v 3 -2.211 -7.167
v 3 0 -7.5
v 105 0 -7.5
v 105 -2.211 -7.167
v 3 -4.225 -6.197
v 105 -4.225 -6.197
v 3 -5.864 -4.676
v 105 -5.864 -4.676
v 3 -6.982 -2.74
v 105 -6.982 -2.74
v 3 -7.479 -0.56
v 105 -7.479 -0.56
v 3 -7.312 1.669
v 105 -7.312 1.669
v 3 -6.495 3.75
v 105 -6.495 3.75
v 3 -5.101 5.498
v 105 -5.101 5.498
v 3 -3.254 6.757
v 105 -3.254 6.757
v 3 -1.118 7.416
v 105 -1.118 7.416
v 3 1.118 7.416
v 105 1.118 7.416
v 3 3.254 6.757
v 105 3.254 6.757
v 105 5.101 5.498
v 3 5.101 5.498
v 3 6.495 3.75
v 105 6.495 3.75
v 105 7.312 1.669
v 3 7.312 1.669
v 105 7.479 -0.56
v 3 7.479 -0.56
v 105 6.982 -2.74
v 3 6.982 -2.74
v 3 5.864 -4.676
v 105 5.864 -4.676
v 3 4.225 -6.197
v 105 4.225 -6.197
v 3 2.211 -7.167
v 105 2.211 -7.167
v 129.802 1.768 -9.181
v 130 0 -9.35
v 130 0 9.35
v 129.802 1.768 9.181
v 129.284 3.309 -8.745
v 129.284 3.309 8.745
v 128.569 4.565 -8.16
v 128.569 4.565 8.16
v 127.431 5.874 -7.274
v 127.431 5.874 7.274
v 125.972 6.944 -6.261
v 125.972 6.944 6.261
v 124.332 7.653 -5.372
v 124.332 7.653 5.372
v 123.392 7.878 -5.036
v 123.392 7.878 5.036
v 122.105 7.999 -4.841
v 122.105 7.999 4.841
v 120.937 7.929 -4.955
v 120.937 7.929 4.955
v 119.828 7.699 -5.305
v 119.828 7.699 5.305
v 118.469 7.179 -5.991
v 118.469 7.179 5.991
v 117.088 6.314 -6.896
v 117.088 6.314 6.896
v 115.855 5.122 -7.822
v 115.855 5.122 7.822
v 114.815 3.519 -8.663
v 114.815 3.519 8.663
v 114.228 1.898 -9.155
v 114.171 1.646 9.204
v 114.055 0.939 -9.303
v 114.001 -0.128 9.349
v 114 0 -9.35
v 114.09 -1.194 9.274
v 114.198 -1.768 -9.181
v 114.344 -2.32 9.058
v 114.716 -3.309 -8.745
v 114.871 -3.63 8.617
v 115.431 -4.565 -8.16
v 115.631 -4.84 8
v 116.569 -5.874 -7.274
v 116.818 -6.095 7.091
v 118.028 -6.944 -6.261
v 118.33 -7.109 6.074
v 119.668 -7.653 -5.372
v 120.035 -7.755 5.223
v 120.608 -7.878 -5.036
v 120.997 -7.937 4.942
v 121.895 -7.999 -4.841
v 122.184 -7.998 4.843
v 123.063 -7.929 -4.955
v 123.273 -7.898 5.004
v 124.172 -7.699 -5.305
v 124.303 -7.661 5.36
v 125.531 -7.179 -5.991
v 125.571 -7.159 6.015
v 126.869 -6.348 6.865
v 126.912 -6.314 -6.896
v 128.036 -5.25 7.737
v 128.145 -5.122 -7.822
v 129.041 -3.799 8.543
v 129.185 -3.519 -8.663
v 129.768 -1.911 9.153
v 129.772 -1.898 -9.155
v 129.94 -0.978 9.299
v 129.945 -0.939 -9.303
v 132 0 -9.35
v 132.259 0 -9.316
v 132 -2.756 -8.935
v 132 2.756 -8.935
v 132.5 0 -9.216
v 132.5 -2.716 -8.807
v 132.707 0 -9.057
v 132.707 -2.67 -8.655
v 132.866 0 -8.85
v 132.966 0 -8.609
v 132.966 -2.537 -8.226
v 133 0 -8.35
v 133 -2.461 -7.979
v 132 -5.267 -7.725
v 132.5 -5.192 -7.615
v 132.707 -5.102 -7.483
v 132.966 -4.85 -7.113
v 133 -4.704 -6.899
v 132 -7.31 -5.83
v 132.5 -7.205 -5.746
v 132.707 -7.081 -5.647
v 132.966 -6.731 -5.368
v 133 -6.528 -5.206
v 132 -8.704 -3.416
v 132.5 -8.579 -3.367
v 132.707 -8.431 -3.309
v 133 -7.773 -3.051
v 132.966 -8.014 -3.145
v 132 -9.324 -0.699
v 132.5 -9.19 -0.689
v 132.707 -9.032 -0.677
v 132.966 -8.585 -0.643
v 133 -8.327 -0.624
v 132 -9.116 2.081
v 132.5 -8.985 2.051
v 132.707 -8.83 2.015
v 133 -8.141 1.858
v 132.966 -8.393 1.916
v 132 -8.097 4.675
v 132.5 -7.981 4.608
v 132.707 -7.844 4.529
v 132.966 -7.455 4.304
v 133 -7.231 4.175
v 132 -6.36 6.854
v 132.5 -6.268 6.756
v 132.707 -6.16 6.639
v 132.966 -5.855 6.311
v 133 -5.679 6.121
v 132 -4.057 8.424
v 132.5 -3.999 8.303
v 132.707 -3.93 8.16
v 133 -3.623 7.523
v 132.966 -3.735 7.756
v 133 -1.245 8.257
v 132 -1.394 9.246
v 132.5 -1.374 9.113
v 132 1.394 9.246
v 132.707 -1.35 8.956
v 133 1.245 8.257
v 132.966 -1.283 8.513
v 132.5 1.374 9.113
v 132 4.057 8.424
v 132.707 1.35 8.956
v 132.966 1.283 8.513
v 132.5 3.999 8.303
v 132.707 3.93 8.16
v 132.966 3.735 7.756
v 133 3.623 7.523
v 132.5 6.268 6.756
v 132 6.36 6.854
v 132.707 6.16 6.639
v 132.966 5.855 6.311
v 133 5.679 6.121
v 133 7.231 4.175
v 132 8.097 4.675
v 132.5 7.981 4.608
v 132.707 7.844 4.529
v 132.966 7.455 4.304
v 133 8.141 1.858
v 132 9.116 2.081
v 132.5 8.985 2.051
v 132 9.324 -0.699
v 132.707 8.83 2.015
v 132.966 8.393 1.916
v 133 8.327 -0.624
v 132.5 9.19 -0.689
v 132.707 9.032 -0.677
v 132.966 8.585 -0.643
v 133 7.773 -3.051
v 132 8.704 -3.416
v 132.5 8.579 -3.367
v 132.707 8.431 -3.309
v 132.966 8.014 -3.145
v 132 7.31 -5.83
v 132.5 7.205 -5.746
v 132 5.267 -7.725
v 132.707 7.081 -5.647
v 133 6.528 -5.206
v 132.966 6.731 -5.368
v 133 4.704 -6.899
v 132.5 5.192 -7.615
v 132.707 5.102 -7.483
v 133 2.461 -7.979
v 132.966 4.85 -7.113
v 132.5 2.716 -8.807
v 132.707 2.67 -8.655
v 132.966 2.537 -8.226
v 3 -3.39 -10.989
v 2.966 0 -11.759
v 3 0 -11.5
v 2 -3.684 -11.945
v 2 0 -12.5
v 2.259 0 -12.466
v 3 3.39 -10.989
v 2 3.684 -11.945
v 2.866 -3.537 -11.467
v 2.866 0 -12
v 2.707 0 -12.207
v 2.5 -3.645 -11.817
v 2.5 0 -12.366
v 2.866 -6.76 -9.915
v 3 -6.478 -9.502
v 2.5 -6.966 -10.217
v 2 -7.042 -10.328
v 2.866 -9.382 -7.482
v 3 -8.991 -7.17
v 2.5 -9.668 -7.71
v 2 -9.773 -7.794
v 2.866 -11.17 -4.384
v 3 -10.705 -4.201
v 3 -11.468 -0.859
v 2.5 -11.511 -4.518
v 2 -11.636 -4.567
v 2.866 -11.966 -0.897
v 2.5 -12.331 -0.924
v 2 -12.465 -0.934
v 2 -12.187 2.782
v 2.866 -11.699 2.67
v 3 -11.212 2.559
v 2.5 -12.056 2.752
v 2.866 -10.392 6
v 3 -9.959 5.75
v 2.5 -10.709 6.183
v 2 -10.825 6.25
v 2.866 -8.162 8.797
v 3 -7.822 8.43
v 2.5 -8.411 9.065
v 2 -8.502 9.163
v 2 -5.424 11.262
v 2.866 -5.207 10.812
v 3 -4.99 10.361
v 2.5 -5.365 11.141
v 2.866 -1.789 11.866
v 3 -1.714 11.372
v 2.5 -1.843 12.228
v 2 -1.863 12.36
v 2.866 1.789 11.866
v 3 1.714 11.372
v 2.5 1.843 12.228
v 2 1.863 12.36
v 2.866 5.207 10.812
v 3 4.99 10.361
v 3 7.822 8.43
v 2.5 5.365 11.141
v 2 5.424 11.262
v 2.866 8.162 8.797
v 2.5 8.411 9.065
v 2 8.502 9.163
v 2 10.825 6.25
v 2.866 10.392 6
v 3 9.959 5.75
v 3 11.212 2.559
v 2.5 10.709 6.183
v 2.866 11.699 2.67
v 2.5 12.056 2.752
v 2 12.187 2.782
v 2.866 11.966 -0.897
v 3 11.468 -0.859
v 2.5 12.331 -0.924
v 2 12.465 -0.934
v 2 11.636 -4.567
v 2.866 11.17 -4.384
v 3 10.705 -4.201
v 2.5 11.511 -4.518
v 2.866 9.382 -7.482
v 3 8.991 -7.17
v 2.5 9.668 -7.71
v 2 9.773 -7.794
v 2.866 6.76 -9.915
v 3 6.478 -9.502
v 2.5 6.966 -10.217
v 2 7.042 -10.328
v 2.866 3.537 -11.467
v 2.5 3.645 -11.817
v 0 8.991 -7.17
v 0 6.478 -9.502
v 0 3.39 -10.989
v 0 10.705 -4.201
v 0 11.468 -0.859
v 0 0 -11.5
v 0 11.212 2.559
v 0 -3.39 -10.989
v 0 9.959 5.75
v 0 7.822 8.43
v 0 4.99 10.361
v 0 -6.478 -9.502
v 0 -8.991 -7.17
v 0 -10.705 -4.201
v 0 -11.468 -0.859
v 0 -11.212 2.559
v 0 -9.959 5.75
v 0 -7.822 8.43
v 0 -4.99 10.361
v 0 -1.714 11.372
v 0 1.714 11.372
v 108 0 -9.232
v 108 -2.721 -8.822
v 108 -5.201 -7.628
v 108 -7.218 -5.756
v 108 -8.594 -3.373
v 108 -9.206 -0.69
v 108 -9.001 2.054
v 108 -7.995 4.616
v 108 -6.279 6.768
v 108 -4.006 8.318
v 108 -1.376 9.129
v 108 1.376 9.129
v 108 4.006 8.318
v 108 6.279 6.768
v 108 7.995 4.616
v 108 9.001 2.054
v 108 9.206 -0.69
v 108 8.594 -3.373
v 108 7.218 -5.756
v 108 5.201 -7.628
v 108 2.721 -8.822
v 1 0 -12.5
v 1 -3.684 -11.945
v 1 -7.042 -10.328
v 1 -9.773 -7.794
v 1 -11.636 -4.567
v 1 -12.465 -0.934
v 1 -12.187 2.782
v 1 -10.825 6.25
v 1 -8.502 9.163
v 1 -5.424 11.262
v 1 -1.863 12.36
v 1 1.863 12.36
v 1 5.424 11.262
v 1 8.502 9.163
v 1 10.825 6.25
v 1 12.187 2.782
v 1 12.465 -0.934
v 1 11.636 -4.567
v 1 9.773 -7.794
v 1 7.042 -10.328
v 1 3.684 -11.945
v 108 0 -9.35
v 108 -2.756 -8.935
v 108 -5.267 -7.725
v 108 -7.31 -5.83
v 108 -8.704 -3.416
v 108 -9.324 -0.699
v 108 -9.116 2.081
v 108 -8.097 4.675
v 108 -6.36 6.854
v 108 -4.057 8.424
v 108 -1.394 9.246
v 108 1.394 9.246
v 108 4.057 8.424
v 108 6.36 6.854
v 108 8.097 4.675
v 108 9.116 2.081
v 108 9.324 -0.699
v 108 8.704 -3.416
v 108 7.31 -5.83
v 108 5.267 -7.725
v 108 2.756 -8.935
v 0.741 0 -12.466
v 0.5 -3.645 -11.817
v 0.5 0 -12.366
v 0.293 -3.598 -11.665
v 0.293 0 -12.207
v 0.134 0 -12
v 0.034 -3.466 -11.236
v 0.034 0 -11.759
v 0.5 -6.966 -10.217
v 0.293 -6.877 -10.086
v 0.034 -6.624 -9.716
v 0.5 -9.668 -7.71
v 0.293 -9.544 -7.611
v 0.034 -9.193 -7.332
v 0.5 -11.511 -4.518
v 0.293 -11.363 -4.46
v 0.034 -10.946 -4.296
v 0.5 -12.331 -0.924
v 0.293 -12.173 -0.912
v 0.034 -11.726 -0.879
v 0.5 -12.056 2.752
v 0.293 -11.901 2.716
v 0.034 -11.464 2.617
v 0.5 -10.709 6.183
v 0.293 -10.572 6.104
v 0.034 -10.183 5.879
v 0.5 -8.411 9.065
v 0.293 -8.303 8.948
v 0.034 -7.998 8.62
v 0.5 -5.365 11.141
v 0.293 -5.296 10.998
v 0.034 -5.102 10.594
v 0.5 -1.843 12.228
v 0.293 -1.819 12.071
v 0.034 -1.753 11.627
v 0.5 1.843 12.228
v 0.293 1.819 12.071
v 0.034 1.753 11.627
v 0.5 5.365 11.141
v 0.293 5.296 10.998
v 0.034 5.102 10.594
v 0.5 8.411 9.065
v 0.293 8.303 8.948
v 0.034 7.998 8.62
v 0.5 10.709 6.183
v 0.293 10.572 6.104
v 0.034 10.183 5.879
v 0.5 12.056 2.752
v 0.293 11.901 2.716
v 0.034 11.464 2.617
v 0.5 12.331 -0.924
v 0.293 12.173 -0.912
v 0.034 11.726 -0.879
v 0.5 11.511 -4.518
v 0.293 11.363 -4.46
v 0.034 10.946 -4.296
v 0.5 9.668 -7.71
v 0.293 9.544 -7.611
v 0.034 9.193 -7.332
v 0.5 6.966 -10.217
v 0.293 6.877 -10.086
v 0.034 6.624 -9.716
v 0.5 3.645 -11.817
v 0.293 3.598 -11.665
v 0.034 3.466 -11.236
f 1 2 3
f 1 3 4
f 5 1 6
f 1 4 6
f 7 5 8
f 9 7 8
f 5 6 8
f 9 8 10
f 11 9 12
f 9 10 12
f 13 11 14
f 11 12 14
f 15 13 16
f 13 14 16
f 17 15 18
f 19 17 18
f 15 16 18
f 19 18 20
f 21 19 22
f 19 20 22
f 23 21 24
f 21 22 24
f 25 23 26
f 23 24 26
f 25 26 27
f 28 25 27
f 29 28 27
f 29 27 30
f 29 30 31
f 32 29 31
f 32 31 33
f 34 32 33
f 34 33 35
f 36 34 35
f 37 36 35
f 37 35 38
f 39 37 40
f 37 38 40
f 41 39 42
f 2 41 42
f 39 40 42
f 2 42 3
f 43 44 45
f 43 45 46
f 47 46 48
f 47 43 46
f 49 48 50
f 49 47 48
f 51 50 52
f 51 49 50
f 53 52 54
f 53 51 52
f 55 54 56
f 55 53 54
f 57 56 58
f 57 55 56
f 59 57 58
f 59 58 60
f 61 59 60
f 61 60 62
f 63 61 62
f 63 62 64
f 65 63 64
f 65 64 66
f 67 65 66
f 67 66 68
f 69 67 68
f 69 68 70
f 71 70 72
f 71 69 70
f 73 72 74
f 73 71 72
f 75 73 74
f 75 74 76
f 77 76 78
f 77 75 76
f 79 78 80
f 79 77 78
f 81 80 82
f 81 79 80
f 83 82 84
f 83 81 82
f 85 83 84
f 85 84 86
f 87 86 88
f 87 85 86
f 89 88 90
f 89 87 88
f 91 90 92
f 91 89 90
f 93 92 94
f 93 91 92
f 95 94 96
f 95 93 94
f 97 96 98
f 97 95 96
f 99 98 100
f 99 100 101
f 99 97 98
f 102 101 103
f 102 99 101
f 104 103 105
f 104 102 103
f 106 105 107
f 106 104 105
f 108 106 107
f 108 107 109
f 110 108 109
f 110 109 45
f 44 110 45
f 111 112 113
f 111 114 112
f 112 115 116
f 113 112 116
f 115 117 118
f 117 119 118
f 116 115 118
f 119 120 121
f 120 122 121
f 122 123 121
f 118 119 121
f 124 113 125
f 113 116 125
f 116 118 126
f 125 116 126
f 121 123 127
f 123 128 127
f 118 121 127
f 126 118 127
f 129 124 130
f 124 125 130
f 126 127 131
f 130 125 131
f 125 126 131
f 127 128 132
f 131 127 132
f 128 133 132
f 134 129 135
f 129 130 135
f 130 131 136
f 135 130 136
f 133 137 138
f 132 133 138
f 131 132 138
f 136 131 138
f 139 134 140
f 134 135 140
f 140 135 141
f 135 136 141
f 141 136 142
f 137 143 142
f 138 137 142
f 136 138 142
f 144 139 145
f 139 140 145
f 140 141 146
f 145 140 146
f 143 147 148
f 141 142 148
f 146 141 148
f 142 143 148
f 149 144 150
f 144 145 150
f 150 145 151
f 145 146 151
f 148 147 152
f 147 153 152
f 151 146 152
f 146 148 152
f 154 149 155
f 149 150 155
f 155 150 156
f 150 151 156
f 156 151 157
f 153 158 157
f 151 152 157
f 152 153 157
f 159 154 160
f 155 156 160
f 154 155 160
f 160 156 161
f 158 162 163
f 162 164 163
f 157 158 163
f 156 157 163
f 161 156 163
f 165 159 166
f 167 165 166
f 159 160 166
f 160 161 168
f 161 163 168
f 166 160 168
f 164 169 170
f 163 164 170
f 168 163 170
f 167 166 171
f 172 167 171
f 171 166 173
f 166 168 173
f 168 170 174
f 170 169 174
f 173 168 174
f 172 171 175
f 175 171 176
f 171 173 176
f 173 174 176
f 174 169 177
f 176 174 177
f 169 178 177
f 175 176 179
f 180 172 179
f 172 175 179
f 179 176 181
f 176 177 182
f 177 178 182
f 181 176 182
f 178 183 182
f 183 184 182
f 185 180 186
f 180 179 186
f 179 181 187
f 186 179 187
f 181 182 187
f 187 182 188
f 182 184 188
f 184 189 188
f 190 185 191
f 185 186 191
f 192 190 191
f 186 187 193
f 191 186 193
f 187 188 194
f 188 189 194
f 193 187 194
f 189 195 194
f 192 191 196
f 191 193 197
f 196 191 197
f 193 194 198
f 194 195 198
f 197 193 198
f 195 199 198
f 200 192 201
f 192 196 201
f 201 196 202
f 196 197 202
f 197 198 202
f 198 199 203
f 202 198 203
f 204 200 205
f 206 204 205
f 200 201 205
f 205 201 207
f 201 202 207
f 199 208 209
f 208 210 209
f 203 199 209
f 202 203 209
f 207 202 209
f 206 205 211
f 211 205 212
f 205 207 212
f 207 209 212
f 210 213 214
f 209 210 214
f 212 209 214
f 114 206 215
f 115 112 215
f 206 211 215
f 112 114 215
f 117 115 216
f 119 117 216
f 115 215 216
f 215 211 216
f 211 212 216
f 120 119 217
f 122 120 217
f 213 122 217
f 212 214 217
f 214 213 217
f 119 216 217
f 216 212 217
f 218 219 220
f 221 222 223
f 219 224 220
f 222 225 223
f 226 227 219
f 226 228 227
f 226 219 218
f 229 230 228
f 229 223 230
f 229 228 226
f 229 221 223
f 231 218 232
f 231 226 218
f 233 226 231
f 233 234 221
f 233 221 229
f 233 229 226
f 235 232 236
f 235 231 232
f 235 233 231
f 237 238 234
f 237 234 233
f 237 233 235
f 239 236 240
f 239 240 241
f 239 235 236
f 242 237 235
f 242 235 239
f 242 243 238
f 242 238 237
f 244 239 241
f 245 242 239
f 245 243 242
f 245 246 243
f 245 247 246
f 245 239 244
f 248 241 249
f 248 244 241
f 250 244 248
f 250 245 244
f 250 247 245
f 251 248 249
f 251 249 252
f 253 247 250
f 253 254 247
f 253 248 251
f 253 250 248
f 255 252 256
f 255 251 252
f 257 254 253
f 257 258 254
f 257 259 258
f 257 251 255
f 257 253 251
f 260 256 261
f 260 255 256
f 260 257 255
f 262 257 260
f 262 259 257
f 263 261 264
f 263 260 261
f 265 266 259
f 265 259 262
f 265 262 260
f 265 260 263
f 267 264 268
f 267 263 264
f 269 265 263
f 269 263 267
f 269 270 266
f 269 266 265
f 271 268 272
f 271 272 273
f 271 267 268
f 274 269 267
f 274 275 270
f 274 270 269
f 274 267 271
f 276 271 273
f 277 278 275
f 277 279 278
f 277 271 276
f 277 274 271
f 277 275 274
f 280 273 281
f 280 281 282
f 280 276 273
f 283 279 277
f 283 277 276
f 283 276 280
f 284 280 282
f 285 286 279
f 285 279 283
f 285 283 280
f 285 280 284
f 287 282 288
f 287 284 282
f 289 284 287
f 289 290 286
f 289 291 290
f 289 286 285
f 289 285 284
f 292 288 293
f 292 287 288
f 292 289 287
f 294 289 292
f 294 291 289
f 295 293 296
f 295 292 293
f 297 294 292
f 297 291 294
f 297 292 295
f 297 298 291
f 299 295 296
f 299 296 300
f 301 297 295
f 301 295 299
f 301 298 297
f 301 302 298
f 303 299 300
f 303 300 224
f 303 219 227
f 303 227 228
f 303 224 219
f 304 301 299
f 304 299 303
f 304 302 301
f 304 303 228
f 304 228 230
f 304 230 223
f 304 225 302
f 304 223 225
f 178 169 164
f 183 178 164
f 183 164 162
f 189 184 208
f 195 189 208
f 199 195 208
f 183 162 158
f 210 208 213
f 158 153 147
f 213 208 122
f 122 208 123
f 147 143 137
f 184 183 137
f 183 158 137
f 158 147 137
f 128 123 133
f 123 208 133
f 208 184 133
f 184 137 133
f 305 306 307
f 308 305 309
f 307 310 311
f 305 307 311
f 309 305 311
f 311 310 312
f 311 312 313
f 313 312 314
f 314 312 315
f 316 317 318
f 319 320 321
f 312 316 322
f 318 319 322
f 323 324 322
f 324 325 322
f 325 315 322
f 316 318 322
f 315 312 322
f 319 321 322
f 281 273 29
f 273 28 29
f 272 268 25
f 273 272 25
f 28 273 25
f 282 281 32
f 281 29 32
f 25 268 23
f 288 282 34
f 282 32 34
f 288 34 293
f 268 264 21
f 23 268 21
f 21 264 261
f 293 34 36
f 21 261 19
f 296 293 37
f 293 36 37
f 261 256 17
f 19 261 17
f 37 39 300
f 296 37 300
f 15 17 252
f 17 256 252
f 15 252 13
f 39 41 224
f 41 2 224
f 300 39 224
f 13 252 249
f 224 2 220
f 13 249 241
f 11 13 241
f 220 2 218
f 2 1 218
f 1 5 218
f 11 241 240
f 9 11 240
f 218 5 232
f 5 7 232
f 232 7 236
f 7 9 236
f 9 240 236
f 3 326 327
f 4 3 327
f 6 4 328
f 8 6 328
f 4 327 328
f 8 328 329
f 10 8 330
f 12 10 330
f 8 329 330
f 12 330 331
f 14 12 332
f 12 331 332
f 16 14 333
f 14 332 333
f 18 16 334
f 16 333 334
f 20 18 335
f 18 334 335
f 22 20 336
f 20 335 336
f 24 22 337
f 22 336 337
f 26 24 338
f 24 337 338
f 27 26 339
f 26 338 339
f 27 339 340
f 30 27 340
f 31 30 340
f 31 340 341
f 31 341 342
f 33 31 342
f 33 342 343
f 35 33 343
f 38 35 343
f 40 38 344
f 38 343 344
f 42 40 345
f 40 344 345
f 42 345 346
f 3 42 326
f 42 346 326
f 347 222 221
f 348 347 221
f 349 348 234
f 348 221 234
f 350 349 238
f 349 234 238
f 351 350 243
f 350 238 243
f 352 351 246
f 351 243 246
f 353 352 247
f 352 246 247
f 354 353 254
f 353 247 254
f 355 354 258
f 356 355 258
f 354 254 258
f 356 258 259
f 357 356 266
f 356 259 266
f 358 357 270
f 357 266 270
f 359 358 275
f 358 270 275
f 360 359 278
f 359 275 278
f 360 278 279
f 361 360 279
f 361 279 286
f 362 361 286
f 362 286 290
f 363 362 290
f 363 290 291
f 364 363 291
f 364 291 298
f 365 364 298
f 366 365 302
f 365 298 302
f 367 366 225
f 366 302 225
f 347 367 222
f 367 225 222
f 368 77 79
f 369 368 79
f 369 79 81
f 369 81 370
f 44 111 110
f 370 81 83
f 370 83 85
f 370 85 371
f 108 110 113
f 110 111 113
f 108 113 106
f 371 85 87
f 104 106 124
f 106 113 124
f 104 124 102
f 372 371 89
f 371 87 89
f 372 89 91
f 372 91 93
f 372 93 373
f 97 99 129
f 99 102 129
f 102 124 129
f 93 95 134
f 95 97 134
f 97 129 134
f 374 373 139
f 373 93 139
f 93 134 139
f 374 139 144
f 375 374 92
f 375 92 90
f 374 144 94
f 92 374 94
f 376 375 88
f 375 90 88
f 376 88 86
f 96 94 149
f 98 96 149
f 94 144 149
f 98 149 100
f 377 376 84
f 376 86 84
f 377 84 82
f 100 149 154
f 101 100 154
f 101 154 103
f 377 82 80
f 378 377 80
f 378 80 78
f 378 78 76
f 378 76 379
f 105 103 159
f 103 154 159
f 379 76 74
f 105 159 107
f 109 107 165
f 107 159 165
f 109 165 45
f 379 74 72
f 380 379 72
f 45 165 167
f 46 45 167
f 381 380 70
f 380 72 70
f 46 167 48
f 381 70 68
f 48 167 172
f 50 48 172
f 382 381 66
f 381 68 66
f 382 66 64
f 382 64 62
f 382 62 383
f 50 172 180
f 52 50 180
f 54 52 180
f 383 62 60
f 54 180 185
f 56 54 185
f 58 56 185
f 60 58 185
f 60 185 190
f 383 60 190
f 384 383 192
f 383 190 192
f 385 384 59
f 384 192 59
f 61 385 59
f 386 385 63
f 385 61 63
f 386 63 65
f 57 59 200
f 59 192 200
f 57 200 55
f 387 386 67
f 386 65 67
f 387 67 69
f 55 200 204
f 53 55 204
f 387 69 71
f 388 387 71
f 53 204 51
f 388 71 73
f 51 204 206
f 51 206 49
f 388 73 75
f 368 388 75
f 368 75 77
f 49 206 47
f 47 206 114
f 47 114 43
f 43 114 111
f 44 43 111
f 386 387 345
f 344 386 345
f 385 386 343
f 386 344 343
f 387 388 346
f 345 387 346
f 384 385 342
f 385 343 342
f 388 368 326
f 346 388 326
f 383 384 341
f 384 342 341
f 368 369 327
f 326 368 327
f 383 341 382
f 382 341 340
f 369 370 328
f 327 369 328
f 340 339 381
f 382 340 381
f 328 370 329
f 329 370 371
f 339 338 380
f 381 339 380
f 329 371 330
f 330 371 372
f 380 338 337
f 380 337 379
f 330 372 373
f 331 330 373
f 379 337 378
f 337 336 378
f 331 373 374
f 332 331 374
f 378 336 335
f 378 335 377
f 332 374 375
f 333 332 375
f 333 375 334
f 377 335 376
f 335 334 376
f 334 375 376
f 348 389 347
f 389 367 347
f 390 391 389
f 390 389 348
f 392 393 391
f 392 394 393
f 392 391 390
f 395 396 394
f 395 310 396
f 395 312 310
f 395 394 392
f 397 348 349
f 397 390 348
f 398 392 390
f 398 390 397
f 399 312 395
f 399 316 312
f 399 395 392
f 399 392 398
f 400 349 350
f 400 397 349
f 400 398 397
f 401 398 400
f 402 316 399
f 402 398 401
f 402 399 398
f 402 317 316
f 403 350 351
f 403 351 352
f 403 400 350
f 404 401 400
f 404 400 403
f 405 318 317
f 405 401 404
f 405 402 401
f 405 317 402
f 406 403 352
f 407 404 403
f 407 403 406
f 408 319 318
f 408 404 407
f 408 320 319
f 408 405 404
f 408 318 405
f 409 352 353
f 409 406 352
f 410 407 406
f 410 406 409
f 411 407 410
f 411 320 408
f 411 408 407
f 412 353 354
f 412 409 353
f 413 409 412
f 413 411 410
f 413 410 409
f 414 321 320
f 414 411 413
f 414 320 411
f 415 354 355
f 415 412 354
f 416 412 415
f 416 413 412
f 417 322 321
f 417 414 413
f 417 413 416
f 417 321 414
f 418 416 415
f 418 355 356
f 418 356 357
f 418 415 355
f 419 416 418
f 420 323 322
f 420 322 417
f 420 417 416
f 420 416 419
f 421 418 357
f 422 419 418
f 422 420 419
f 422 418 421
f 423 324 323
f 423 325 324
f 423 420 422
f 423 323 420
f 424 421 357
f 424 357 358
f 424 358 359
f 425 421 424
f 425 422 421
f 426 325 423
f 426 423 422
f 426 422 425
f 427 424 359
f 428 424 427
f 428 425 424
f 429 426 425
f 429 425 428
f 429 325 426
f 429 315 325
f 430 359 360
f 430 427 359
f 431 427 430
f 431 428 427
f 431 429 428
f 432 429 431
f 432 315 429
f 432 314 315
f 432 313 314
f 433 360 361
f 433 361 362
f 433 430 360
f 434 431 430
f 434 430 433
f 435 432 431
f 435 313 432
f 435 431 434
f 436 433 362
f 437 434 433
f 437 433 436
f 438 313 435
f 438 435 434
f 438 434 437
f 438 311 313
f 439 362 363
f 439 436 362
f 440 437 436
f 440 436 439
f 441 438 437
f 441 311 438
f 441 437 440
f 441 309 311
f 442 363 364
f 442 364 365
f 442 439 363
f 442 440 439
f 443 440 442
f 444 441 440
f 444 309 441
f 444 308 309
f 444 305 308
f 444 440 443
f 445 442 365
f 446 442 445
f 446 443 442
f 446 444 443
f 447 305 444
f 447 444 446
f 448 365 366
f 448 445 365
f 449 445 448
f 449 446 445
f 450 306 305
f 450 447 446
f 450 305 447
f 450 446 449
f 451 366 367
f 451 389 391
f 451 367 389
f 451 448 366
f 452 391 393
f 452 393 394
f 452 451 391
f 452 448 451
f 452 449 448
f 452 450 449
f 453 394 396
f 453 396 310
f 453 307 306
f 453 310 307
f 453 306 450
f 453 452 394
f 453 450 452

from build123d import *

# Parameters (mm, degrees)
CHAMFER1_SIZE           = 3
CHAMFER1_SIZE2          = 1.732050808
CUT_EXTRUDE1_DEPTH      = 135.169668703
CUT_EXTRUDE1_DEPTH_BACK = 135.169668703
SKETCH2_R               = 8
FILLET1_R               = 1


with BuildPart() as part:
    # Sketch1 → Revolve1 (revolve)
    with BuildSketch(Plane(origin=(0, 0, 0), x_dir=(1, 0, 0), z_dir=(0, 1, 0))):
        Polygon((0, 0), (0, 12.5), (3, 12.5), (3, 7.5), (108, 7.5), (108, 9.35), (133, 9.35), (133, 0), align=None)
    revolve(axis=Axis((133, 0, 0), (-1, 0, 0)))

    # Chamfer1
    chamfer1_edges = [part.edges().sort_by_distance(p)[0] for p in [
        (108, 0, 7.5),
    ]]
    chamfer1_side = [part.faces().sort_by_distance(p)[0] for p in [
        (55.5, 0, 7.5),
    ]]
    chamfer(chamfer1_edges, length=CHAMFER1_SIZE, length2=CHAMFER1_SIZE2, reference=chamfer1_side[0])

    # Sketch2 → Cut-Extrude1 (cut, two sides: drawn at the far end of the back side and taken through both)
    with BuildSketch(Plane.XY.offset(-CUT_EXTRUDE1_DEPTH_BACK)):
        with Locations((122, 0)):
            Circle(SKETCH2_R)
    extrude(amount=CUT_EXTRUDE1_DEPTH + CUT_EXTRUDE1_DEPTH_BACK, mode=Mode.SUBTRACT)

    # Fillet1
    fillet1_edges = [part.edges().sort_by_distance(p)[0] for p in [
        (133, 0, 9.35),
        (3, 0, 12.5),
        (0, 0, 12.5),
    ]]
    fillet(fillet1_edges, radius=FILLET1_R)


solid = part.part
